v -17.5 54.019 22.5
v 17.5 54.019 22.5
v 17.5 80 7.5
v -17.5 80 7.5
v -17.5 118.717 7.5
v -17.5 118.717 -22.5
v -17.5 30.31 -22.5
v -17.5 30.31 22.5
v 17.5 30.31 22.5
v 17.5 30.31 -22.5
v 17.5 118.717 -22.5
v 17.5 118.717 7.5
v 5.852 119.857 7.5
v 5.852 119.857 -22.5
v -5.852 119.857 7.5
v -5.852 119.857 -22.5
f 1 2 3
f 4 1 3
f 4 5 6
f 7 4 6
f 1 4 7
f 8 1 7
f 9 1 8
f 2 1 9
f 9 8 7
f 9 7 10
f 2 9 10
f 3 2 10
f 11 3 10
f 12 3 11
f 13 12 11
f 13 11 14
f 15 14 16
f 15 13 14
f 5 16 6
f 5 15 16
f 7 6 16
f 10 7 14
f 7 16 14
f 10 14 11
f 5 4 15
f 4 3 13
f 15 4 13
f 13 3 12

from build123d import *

# Parameters (mm, degrees)
BOSS_EXTRUDE1_DEPTH = 22.5
CUT_EXTRUDE1_DEPTH  = 128.008857959


with BuildPart() as part:
    # Sketch1 → Boss-Extrude1 (new, symmetric)
    with BuildSketch(Plane.XY):
        with BuildLine():
            Line((-17.5, 118.717100706), (-17.5, 30.31))
            Line((-17.5, 30.31), (17.5, 30.31))
            Line((17.5, 30.31), (17.5, 118.717100706))
            ThreePointArc((17.5, 118.717100706), (0, 120), (-17.5, 118.717100706))
        make_face()
    extrude(amount=BOSS_EXTRUDE1_DEPTH, both=True)

    # Sketch2 → Cut-Extrude1 (cut, through all)
    with BuildSketch(Plane(origin=(17.5, 0, 0), x_dir=(0, 0, -1), z_dir=(1, 0, 0))):
        Polygon((-22.5, 54.019237886), (-7.5, 80), (-7.5, 120), (-22.5, 120), align=None)
    extrude(amount=-CUT_EXTRUDE1_DEPTH, mode=Mode.SUBTRACT)


solid = part.part
